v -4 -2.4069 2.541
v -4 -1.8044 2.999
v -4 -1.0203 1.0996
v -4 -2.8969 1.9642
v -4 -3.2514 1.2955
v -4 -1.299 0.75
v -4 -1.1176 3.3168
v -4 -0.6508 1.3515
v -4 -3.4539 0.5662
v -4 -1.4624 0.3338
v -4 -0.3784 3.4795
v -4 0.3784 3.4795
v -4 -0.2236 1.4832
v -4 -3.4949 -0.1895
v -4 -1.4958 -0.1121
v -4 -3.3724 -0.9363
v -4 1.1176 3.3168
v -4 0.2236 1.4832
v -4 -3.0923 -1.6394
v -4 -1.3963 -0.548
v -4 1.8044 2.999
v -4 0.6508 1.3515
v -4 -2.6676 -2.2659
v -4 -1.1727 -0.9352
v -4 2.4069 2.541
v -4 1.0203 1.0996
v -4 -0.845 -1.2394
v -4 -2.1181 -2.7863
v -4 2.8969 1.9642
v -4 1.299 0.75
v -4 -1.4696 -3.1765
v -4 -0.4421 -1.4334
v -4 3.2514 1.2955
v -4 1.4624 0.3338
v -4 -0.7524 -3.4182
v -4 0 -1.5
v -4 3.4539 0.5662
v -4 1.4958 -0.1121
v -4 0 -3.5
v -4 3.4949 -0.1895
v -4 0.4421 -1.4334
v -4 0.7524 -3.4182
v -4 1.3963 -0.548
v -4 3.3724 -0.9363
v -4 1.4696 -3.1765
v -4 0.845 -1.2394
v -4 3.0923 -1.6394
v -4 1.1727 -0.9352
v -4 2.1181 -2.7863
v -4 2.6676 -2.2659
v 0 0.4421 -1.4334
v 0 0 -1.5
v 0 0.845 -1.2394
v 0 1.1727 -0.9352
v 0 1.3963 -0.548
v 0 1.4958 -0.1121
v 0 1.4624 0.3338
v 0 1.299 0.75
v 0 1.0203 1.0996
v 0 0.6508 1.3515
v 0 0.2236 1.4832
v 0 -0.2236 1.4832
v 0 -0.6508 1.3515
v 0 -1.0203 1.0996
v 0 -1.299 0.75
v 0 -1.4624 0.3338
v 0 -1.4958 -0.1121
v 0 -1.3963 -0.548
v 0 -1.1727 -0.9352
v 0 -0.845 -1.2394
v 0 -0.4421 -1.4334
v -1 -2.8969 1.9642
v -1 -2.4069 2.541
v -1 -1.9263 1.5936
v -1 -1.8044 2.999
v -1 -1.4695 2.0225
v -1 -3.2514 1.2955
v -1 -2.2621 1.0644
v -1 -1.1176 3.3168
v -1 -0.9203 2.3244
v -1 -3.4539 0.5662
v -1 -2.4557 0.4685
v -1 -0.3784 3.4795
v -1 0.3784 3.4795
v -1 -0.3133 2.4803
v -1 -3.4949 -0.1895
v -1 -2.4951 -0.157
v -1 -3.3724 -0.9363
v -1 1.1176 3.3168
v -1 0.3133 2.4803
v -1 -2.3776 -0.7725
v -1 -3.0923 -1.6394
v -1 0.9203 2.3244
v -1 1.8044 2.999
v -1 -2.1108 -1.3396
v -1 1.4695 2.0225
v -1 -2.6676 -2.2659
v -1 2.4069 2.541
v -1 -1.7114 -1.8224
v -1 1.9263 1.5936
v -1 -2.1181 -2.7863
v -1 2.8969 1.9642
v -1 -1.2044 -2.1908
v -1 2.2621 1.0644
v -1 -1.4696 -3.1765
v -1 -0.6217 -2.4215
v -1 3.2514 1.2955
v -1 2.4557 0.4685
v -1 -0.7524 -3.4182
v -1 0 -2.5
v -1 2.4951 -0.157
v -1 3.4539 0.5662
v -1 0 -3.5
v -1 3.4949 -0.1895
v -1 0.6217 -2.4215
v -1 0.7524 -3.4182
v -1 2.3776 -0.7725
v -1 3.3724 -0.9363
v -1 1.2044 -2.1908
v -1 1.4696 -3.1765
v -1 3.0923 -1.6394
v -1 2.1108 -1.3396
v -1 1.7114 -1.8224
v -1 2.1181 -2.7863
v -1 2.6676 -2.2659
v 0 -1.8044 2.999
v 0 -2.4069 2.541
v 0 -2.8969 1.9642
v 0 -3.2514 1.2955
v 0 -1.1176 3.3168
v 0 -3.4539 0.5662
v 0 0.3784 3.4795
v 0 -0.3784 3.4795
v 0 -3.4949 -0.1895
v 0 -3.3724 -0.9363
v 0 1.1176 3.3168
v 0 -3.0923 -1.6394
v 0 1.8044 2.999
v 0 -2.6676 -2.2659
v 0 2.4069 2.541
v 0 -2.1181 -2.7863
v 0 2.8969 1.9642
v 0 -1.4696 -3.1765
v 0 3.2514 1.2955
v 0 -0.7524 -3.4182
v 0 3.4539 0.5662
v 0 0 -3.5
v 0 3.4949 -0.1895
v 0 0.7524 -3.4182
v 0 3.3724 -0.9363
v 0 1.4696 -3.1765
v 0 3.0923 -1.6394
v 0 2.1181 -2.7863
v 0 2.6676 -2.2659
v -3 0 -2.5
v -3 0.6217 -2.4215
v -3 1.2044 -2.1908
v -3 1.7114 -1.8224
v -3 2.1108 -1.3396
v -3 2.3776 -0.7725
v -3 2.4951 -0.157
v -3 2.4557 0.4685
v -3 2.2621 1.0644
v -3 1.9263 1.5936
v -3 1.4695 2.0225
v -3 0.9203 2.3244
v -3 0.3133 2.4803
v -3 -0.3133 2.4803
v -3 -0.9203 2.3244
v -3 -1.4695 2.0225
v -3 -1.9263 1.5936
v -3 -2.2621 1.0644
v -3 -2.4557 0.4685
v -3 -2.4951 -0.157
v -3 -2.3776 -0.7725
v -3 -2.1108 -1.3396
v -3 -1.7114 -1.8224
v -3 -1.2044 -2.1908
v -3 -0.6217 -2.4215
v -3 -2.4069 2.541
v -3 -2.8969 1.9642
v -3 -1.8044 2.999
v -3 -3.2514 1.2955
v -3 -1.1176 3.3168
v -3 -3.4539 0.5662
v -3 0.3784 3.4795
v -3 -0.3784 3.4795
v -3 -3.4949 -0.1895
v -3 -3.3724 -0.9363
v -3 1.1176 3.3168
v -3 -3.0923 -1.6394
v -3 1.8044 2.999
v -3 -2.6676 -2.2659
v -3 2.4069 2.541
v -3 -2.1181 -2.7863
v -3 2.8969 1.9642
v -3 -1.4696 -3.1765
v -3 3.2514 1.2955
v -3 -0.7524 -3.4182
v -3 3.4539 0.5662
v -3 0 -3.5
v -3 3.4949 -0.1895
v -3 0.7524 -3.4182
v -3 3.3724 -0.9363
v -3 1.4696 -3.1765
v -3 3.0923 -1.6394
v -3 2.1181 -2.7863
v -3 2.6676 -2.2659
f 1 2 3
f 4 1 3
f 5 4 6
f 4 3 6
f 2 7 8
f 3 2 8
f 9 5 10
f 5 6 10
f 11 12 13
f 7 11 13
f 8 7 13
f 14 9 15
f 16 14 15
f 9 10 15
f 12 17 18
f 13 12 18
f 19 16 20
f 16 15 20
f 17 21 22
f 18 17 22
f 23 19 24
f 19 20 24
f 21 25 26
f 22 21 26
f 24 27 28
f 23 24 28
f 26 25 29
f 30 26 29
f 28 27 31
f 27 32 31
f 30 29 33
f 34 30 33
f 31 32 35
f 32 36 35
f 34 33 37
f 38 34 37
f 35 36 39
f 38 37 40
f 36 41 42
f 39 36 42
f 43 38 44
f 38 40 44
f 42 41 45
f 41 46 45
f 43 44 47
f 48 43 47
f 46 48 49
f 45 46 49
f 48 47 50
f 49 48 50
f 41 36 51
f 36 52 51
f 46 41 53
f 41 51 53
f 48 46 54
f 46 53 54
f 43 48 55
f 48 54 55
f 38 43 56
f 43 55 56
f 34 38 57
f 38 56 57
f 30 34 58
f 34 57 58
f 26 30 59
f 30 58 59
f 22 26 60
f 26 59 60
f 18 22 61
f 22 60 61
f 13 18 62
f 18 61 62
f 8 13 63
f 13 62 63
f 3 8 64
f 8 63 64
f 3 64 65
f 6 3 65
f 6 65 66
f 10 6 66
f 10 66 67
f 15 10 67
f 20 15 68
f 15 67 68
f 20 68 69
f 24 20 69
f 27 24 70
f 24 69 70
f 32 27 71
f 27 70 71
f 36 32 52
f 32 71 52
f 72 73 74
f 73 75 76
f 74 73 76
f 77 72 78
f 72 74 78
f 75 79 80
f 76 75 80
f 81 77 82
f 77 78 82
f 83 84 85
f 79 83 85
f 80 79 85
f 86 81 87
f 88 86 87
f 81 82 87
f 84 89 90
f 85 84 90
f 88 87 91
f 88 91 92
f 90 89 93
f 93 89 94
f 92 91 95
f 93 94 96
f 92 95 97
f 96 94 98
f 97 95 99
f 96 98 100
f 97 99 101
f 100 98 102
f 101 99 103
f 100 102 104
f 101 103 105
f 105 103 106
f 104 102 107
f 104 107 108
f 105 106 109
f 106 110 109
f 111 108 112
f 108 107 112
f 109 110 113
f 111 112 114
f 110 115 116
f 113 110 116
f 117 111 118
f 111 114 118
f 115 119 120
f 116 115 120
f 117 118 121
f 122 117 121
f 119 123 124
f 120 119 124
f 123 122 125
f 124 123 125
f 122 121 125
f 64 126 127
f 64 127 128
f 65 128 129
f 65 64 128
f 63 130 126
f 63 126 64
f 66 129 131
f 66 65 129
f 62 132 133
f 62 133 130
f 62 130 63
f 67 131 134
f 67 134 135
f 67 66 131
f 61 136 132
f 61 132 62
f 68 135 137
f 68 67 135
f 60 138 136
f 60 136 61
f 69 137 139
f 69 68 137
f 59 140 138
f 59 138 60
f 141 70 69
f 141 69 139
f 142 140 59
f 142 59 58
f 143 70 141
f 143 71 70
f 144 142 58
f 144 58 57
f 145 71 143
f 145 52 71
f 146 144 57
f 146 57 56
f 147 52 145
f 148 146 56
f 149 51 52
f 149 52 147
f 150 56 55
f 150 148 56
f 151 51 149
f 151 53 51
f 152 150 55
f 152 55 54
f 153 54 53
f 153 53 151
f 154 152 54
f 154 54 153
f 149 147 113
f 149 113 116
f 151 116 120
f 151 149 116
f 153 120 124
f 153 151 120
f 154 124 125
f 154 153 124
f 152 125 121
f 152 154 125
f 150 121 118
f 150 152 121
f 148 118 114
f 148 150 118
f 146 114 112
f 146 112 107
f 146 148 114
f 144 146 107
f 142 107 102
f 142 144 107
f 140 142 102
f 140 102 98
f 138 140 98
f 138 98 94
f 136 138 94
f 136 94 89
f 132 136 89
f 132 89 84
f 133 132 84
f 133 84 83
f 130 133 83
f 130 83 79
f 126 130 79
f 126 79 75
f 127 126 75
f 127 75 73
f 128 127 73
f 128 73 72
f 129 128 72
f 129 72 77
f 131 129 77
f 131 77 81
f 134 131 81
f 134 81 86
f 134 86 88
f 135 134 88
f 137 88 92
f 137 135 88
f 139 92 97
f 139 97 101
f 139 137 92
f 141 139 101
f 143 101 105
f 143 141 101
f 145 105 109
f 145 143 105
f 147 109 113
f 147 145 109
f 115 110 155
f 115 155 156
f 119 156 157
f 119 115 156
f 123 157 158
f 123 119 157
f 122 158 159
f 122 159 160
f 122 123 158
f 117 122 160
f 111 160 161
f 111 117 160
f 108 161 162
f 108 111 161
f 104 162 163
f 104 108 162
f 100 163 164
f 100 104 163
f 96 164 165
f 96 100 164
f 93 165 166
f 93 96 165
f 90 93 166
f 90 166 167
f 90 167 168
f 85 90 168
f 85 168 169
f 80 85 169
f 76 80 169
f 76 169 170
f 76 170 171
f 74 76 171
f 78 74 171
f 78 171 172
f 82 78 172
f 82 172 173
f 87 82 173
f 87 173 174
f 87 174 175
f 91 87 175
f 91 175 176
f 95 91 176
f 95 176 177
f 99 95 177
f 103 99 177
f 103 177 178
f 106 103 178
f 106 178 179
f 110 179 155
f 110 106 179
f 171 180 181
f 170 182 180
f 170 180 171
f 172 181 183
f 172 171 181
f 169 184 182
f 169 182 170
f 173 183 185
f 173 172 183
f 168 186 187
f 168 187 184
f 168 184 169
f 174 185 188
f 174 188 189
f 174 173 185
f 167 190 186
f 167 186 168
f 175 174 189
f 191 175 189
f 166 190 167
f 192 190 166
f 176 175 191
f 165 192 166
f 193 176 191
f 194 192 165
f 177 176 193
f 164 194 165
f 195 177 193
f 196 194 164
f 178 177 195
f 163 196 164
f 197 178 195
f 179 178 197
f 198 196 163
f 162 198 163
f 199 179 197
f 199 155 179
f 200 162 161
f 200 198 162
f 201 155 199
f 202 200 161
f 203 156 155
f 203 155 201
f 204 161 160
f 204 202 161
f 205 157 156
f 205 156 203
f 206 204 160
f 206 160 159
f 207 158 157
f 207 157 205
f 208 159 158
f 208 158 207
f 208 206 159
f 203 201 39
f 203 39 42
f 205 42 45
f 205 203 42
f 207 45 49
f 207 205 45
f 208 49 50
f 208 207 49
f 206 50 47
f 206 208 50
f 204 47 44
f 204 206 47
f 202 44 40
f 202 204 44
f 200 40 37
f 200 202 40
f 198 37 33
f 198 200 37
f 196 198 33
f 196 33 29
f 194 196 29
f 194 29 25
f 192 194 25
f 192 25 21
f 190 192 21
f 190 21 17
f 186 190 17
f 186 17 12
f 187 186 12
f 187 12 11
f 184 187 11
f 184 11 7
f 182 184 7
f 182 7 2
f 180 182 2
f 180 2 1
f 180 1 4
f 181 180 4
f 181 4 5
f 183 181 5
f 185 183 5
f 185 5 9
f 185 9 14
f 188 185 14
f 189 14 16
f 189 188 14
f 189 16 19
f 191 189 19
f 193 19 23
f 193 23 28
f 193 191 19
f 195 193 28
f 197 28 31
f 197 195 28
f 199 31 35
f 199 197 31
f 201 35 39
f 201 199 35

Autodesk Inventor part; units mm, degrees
ref_plane "YZ Plane" through (0, 0, 0) normal (1, 0, 0) x (0, 1, 0)
ref_plane "XZ Plane" through (0, 0, 0) normal (0, 1, 0) x (-1, 0, 0)
ref_plane "XY Plane" through (0, 0, 0) normal (0, 0, 1) x (1, 0, 0)
sketch "スケッチ1" plane through (0, 0, 0) normal (0, 1, 0) x (-1, 0, 0)
  line L0 (4, 0) -> (4, -3.5)
  line L1 (4, -3.5) -> (3, -3.5)
  line L2 (3, -3.5) -> (3, -2.5)
  line L3 (3, -2.5) -> (1, -2.5)
  line L4 (1, -2.5) -> (1, -3.5)
  line L5 (1, -3.5) -> (0, -3.5)
  line L6 (0, -3.5) -> (0, 0)
  line L7 (4, 0) -> (0, 0)
  line L8 (4, -1.5) -> (0, -1.5)
  dimension "d1" = 1
  dimension "d2" = 2
  dimension "d3" = 1.5
  dimension "d4" = 1
  dimension "d5" = 1
revolve "回転1" add sketch "スケッチ1" angle 360 about axis through (-4, 0, 0) along (1, 0, 0) contours L0 L1 L2 L3 L4 L5 L6 L8
properties part number "Pulley_MotorSide"
